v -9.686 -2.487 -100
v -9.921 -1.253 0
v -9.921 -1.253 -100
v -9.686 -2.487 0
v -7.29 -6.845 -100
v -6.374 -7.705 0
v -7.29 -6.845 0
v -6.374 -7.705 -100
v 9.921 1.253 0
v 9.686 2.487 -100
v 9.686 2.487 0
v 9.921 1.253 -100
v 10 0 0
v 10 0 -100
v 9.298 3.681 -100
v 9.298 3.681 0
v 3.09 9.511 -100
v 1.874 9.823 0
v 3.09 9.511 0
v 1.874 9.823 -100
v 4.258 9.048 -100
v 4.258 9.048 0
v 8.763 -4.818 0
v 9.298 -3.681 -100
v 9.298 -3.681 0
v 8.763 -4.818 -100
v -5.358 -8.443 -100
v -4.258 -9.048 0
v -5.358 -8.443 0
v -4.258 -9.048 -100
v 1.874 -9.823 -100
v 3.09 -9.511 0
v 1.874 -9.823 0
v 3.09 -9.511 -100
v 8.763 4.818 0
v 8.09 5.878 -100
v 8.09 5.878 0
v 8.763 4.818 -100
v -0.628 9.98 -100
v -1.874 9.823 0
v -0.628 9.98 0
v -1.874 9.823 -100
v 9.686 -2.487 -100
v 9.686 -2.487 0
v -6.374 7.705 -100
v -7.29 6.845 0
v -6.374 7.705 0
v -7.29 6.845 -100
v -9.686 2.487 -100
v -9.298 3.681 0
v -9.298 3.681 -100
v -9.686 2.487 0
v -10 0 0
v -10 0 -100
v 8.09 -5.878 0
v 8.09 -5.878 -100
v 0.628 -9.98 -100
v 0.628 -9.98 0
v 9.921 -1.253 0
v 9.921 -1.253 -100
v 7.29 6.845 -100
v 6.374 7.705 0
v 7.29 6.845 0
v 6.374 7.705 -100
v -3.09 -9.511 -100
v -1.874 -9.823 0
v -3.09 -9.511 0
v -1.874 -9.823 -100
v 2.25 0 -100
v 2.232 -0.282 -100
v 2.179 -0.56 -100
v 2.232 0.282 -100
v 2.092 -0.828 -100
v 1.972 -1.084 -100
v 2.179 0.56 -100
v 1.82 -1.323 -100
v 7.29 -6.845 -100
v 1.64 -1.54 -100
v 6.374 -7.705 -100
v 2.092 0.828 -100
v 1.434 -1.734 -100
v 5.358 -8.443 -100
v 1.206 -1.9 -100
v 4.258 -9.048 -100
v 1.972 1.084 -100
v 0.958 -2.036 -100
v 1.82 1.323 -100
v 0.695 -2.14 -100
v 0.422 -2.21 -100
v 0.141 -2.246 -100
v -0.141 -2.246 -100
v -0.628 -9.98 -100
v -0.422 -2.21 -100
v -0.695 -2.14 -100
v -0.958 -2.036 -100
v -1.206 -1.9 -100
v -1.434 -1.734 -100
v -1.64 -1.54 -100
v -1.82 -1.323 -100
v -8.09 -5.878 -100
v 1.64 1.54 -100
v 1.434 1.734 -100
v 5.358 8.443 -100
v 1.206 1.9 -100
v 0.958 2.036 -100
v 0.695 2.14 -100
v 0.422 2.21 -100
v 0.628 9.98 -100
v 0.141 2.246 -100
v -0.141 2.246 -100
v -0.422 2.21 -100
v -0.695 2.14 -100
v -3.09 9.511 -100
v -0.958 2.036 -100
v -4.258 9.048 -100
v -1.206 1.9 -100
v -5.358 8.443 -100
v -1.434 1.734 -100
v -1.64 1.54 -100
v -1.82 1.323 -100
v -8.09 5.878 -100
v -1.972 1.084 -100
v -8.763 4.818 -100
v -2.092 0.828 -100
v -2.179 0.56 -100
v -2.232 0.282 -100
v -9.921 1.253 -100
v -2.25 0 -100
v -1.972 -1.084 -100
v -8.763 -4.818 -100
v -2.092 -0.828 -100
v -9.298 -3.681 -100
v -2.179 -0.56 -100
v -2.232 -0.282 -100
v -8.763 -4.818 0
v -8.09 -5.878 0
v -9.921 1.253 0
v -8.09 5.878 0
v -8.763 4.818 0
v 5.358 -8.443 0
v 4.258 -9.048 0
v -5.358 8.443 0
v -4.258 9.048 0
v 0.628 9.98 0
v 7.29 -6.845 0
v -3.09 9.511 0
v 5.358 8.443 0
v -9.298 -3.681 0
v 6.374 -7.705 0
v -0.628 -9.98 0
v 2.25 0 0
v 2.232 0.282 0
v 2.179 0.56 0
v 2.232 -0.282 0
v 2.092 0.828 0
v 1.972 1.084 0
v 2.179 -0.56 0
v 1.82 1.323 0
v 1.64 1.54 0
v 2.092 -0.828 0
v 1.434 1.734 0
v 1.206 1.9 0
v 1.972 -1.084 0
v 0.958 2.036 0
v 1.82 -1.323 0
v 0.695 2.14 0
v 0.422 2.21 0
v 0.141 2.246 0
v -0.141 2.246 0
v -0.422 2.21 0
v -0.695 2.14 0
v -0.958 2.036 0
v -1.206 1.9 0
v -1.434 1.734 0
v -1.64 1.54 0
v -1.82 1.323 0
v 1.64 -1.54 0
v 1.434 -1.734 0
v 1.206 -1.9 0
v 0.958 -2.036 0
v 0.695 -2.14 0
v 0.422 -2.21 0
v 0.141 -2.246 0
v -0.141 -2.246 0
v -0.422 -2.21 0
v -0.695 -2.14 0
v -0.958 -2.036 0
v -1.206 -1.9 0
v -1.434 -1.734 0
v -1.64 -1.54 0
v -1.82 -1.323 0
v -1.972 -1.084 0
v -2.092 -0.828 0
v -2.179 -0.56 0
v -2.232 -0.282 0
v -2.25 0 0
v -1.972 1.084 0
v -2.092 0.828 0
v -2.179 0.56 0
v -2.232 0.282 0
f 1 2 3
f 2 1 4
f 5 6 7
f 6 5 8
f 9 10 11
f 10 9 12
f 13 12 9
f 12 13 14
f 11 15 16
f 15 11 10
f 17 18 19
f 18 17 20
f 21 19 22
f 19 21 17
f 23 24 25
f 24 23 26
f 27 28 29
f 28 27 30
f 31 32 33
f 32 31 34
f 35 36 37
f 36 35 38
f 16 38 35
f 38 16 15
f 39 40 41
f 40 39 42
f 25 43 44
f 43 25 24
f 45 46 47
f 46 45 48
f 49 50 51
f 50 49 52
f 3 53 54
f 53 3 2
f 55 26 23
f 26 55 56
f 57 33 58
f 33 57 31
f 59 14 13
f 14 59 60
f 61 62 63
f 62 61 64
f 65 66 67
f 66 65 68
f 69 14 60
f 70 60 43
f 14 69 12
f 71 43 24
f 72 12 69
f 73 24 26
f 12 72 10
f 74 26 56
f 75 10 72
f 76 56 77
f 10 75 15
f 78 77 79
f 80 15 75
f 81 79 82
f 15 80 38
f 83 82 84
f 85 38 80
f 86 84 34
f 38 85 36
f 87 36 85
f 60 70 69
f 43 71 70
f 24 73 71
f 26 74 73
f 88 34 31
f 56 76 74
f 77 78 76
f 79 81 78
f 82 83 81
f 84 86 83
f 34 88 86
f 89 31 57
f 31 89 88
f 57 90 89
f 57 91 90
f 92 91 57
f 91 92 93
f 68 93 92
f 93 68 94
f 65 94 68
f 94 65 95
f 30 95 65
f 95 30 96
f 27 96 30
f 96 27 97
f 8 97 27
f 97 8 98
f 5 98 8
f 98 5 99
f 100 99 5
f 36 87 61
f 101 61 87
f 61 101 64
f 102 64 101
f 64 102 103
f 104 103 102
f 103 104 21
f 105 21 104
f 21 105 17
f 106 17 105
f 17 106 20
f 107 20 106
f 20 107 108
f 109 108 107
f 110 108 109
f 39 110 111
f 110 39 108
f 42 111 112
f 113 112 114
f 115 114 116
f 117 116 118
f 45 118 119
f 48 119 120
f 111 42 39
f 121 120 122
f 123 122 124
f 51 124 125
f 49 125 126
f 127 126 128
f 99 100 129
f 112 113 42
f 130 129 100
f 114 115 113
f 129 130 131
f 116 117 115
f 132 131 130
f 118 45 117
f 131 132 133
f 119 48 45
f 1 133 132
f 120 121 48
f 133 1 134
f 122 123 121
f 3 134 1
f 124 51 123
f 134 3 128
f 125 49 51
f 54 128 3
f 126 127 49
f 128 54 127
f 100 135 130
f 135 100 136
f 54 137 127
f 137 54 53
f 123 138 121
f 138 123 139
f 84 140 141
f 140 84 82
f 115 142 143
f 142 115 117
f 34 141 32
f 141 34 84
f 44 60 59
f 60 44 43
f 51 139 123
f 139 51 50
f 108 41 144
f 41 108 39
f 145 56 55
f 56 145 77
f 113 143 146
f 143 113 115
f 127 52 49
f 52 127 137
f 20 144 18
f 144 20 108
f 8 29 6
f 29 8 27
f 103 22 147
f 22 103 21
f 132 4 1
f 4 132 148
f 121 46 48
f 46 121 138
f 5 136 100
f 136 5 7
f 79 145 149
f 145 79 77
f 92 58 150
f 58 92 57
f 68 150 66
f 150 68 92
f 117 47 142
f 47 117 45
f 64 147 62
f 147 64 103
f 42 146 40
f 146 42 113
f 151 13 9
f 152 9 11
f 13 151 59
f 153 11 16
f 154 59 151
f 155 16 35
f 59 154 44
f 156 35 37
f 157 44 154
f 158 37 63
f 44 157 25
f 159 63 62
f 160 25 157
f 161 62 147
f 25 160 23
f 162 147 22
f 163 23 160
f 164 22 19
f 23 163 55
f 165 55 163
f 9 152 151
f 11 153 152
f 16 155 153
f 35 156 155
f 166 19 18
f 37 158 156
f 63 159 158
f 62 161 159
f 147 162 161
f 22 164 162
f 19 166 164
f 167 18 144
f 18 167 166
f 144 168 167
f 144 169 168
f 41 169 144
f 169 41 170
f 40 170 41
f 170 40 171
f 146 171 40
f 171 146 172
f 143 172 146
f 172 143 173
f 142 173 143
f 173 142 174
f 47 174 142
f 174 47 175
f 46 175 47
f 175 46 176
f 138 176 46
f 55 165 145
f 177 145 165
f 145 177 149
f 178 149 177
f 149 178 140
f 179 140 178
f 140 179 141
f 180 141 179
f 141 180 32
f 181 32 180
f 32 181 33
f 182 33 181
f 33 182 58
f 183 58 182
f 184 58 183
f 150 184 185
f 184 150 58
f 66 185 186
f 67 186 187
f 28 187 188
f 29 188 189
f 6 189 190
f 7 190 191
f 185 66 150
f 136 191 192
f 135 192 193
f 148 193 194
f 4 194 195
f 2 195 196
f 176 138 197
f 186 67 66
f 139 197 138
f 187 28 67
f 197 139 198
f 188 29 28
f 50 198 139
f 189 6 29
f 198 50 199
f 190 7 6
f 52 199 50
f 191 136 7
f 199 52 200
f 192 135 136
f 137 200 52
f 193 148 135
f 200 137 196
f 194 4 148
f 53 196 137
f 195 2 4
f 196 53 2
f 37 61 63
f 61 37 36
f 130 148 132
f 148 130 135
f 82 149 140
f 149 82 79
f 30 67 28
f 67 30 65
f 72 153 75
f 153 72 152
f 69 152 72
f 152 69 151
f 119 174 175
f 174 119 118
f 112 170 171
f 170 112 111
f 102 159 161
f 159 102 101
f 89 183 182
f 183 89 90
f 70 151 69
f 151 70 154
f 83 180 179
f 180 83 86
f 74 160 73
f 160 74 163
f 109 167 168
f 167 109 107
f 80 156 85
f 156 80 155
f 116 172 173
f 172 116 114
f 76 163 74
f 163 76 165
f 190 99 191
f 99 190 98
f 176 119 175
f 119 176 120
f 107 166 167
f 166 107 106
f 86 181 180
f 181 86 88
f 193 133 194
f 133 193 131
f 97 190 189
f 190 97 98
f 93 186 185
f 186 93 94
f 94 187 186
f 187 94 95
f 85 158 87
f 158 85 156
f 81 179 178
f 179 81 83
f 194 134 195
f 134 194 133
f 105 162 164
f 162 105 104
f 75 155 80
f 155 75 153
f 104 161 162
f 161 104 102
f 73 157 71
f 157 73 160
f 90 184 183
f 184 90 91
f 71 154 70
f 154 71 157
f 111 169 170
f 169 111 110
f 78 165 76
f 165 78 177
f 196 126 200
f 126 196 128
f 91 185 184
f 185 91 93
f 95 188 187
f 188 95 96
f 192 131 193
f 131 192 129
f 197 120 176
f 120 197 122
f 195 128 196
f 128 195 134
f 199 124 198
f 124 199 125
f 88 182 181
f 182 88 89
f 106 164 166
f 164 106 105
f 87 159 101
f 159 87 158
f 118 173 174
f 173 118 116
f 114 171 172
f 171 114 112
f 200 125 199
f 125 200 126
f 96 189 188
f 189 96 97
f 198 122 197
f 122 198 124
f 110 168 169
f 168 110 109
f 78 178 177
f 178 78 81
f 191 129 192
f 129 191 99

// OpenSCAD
$fn = 50;


difference() {
	union() {
		translate(v = [0, 0, -100.0000000000]) {
			cylinder(h = 100, r = 10.0000000000);
		}
		cylinder(h = 0, r = 19.0000000000);
	}
	union() {
		#translate(v = [0, 0, -100]) {
			cylinder(h = 100, r = 2.2500000000);
		}
	}
}
